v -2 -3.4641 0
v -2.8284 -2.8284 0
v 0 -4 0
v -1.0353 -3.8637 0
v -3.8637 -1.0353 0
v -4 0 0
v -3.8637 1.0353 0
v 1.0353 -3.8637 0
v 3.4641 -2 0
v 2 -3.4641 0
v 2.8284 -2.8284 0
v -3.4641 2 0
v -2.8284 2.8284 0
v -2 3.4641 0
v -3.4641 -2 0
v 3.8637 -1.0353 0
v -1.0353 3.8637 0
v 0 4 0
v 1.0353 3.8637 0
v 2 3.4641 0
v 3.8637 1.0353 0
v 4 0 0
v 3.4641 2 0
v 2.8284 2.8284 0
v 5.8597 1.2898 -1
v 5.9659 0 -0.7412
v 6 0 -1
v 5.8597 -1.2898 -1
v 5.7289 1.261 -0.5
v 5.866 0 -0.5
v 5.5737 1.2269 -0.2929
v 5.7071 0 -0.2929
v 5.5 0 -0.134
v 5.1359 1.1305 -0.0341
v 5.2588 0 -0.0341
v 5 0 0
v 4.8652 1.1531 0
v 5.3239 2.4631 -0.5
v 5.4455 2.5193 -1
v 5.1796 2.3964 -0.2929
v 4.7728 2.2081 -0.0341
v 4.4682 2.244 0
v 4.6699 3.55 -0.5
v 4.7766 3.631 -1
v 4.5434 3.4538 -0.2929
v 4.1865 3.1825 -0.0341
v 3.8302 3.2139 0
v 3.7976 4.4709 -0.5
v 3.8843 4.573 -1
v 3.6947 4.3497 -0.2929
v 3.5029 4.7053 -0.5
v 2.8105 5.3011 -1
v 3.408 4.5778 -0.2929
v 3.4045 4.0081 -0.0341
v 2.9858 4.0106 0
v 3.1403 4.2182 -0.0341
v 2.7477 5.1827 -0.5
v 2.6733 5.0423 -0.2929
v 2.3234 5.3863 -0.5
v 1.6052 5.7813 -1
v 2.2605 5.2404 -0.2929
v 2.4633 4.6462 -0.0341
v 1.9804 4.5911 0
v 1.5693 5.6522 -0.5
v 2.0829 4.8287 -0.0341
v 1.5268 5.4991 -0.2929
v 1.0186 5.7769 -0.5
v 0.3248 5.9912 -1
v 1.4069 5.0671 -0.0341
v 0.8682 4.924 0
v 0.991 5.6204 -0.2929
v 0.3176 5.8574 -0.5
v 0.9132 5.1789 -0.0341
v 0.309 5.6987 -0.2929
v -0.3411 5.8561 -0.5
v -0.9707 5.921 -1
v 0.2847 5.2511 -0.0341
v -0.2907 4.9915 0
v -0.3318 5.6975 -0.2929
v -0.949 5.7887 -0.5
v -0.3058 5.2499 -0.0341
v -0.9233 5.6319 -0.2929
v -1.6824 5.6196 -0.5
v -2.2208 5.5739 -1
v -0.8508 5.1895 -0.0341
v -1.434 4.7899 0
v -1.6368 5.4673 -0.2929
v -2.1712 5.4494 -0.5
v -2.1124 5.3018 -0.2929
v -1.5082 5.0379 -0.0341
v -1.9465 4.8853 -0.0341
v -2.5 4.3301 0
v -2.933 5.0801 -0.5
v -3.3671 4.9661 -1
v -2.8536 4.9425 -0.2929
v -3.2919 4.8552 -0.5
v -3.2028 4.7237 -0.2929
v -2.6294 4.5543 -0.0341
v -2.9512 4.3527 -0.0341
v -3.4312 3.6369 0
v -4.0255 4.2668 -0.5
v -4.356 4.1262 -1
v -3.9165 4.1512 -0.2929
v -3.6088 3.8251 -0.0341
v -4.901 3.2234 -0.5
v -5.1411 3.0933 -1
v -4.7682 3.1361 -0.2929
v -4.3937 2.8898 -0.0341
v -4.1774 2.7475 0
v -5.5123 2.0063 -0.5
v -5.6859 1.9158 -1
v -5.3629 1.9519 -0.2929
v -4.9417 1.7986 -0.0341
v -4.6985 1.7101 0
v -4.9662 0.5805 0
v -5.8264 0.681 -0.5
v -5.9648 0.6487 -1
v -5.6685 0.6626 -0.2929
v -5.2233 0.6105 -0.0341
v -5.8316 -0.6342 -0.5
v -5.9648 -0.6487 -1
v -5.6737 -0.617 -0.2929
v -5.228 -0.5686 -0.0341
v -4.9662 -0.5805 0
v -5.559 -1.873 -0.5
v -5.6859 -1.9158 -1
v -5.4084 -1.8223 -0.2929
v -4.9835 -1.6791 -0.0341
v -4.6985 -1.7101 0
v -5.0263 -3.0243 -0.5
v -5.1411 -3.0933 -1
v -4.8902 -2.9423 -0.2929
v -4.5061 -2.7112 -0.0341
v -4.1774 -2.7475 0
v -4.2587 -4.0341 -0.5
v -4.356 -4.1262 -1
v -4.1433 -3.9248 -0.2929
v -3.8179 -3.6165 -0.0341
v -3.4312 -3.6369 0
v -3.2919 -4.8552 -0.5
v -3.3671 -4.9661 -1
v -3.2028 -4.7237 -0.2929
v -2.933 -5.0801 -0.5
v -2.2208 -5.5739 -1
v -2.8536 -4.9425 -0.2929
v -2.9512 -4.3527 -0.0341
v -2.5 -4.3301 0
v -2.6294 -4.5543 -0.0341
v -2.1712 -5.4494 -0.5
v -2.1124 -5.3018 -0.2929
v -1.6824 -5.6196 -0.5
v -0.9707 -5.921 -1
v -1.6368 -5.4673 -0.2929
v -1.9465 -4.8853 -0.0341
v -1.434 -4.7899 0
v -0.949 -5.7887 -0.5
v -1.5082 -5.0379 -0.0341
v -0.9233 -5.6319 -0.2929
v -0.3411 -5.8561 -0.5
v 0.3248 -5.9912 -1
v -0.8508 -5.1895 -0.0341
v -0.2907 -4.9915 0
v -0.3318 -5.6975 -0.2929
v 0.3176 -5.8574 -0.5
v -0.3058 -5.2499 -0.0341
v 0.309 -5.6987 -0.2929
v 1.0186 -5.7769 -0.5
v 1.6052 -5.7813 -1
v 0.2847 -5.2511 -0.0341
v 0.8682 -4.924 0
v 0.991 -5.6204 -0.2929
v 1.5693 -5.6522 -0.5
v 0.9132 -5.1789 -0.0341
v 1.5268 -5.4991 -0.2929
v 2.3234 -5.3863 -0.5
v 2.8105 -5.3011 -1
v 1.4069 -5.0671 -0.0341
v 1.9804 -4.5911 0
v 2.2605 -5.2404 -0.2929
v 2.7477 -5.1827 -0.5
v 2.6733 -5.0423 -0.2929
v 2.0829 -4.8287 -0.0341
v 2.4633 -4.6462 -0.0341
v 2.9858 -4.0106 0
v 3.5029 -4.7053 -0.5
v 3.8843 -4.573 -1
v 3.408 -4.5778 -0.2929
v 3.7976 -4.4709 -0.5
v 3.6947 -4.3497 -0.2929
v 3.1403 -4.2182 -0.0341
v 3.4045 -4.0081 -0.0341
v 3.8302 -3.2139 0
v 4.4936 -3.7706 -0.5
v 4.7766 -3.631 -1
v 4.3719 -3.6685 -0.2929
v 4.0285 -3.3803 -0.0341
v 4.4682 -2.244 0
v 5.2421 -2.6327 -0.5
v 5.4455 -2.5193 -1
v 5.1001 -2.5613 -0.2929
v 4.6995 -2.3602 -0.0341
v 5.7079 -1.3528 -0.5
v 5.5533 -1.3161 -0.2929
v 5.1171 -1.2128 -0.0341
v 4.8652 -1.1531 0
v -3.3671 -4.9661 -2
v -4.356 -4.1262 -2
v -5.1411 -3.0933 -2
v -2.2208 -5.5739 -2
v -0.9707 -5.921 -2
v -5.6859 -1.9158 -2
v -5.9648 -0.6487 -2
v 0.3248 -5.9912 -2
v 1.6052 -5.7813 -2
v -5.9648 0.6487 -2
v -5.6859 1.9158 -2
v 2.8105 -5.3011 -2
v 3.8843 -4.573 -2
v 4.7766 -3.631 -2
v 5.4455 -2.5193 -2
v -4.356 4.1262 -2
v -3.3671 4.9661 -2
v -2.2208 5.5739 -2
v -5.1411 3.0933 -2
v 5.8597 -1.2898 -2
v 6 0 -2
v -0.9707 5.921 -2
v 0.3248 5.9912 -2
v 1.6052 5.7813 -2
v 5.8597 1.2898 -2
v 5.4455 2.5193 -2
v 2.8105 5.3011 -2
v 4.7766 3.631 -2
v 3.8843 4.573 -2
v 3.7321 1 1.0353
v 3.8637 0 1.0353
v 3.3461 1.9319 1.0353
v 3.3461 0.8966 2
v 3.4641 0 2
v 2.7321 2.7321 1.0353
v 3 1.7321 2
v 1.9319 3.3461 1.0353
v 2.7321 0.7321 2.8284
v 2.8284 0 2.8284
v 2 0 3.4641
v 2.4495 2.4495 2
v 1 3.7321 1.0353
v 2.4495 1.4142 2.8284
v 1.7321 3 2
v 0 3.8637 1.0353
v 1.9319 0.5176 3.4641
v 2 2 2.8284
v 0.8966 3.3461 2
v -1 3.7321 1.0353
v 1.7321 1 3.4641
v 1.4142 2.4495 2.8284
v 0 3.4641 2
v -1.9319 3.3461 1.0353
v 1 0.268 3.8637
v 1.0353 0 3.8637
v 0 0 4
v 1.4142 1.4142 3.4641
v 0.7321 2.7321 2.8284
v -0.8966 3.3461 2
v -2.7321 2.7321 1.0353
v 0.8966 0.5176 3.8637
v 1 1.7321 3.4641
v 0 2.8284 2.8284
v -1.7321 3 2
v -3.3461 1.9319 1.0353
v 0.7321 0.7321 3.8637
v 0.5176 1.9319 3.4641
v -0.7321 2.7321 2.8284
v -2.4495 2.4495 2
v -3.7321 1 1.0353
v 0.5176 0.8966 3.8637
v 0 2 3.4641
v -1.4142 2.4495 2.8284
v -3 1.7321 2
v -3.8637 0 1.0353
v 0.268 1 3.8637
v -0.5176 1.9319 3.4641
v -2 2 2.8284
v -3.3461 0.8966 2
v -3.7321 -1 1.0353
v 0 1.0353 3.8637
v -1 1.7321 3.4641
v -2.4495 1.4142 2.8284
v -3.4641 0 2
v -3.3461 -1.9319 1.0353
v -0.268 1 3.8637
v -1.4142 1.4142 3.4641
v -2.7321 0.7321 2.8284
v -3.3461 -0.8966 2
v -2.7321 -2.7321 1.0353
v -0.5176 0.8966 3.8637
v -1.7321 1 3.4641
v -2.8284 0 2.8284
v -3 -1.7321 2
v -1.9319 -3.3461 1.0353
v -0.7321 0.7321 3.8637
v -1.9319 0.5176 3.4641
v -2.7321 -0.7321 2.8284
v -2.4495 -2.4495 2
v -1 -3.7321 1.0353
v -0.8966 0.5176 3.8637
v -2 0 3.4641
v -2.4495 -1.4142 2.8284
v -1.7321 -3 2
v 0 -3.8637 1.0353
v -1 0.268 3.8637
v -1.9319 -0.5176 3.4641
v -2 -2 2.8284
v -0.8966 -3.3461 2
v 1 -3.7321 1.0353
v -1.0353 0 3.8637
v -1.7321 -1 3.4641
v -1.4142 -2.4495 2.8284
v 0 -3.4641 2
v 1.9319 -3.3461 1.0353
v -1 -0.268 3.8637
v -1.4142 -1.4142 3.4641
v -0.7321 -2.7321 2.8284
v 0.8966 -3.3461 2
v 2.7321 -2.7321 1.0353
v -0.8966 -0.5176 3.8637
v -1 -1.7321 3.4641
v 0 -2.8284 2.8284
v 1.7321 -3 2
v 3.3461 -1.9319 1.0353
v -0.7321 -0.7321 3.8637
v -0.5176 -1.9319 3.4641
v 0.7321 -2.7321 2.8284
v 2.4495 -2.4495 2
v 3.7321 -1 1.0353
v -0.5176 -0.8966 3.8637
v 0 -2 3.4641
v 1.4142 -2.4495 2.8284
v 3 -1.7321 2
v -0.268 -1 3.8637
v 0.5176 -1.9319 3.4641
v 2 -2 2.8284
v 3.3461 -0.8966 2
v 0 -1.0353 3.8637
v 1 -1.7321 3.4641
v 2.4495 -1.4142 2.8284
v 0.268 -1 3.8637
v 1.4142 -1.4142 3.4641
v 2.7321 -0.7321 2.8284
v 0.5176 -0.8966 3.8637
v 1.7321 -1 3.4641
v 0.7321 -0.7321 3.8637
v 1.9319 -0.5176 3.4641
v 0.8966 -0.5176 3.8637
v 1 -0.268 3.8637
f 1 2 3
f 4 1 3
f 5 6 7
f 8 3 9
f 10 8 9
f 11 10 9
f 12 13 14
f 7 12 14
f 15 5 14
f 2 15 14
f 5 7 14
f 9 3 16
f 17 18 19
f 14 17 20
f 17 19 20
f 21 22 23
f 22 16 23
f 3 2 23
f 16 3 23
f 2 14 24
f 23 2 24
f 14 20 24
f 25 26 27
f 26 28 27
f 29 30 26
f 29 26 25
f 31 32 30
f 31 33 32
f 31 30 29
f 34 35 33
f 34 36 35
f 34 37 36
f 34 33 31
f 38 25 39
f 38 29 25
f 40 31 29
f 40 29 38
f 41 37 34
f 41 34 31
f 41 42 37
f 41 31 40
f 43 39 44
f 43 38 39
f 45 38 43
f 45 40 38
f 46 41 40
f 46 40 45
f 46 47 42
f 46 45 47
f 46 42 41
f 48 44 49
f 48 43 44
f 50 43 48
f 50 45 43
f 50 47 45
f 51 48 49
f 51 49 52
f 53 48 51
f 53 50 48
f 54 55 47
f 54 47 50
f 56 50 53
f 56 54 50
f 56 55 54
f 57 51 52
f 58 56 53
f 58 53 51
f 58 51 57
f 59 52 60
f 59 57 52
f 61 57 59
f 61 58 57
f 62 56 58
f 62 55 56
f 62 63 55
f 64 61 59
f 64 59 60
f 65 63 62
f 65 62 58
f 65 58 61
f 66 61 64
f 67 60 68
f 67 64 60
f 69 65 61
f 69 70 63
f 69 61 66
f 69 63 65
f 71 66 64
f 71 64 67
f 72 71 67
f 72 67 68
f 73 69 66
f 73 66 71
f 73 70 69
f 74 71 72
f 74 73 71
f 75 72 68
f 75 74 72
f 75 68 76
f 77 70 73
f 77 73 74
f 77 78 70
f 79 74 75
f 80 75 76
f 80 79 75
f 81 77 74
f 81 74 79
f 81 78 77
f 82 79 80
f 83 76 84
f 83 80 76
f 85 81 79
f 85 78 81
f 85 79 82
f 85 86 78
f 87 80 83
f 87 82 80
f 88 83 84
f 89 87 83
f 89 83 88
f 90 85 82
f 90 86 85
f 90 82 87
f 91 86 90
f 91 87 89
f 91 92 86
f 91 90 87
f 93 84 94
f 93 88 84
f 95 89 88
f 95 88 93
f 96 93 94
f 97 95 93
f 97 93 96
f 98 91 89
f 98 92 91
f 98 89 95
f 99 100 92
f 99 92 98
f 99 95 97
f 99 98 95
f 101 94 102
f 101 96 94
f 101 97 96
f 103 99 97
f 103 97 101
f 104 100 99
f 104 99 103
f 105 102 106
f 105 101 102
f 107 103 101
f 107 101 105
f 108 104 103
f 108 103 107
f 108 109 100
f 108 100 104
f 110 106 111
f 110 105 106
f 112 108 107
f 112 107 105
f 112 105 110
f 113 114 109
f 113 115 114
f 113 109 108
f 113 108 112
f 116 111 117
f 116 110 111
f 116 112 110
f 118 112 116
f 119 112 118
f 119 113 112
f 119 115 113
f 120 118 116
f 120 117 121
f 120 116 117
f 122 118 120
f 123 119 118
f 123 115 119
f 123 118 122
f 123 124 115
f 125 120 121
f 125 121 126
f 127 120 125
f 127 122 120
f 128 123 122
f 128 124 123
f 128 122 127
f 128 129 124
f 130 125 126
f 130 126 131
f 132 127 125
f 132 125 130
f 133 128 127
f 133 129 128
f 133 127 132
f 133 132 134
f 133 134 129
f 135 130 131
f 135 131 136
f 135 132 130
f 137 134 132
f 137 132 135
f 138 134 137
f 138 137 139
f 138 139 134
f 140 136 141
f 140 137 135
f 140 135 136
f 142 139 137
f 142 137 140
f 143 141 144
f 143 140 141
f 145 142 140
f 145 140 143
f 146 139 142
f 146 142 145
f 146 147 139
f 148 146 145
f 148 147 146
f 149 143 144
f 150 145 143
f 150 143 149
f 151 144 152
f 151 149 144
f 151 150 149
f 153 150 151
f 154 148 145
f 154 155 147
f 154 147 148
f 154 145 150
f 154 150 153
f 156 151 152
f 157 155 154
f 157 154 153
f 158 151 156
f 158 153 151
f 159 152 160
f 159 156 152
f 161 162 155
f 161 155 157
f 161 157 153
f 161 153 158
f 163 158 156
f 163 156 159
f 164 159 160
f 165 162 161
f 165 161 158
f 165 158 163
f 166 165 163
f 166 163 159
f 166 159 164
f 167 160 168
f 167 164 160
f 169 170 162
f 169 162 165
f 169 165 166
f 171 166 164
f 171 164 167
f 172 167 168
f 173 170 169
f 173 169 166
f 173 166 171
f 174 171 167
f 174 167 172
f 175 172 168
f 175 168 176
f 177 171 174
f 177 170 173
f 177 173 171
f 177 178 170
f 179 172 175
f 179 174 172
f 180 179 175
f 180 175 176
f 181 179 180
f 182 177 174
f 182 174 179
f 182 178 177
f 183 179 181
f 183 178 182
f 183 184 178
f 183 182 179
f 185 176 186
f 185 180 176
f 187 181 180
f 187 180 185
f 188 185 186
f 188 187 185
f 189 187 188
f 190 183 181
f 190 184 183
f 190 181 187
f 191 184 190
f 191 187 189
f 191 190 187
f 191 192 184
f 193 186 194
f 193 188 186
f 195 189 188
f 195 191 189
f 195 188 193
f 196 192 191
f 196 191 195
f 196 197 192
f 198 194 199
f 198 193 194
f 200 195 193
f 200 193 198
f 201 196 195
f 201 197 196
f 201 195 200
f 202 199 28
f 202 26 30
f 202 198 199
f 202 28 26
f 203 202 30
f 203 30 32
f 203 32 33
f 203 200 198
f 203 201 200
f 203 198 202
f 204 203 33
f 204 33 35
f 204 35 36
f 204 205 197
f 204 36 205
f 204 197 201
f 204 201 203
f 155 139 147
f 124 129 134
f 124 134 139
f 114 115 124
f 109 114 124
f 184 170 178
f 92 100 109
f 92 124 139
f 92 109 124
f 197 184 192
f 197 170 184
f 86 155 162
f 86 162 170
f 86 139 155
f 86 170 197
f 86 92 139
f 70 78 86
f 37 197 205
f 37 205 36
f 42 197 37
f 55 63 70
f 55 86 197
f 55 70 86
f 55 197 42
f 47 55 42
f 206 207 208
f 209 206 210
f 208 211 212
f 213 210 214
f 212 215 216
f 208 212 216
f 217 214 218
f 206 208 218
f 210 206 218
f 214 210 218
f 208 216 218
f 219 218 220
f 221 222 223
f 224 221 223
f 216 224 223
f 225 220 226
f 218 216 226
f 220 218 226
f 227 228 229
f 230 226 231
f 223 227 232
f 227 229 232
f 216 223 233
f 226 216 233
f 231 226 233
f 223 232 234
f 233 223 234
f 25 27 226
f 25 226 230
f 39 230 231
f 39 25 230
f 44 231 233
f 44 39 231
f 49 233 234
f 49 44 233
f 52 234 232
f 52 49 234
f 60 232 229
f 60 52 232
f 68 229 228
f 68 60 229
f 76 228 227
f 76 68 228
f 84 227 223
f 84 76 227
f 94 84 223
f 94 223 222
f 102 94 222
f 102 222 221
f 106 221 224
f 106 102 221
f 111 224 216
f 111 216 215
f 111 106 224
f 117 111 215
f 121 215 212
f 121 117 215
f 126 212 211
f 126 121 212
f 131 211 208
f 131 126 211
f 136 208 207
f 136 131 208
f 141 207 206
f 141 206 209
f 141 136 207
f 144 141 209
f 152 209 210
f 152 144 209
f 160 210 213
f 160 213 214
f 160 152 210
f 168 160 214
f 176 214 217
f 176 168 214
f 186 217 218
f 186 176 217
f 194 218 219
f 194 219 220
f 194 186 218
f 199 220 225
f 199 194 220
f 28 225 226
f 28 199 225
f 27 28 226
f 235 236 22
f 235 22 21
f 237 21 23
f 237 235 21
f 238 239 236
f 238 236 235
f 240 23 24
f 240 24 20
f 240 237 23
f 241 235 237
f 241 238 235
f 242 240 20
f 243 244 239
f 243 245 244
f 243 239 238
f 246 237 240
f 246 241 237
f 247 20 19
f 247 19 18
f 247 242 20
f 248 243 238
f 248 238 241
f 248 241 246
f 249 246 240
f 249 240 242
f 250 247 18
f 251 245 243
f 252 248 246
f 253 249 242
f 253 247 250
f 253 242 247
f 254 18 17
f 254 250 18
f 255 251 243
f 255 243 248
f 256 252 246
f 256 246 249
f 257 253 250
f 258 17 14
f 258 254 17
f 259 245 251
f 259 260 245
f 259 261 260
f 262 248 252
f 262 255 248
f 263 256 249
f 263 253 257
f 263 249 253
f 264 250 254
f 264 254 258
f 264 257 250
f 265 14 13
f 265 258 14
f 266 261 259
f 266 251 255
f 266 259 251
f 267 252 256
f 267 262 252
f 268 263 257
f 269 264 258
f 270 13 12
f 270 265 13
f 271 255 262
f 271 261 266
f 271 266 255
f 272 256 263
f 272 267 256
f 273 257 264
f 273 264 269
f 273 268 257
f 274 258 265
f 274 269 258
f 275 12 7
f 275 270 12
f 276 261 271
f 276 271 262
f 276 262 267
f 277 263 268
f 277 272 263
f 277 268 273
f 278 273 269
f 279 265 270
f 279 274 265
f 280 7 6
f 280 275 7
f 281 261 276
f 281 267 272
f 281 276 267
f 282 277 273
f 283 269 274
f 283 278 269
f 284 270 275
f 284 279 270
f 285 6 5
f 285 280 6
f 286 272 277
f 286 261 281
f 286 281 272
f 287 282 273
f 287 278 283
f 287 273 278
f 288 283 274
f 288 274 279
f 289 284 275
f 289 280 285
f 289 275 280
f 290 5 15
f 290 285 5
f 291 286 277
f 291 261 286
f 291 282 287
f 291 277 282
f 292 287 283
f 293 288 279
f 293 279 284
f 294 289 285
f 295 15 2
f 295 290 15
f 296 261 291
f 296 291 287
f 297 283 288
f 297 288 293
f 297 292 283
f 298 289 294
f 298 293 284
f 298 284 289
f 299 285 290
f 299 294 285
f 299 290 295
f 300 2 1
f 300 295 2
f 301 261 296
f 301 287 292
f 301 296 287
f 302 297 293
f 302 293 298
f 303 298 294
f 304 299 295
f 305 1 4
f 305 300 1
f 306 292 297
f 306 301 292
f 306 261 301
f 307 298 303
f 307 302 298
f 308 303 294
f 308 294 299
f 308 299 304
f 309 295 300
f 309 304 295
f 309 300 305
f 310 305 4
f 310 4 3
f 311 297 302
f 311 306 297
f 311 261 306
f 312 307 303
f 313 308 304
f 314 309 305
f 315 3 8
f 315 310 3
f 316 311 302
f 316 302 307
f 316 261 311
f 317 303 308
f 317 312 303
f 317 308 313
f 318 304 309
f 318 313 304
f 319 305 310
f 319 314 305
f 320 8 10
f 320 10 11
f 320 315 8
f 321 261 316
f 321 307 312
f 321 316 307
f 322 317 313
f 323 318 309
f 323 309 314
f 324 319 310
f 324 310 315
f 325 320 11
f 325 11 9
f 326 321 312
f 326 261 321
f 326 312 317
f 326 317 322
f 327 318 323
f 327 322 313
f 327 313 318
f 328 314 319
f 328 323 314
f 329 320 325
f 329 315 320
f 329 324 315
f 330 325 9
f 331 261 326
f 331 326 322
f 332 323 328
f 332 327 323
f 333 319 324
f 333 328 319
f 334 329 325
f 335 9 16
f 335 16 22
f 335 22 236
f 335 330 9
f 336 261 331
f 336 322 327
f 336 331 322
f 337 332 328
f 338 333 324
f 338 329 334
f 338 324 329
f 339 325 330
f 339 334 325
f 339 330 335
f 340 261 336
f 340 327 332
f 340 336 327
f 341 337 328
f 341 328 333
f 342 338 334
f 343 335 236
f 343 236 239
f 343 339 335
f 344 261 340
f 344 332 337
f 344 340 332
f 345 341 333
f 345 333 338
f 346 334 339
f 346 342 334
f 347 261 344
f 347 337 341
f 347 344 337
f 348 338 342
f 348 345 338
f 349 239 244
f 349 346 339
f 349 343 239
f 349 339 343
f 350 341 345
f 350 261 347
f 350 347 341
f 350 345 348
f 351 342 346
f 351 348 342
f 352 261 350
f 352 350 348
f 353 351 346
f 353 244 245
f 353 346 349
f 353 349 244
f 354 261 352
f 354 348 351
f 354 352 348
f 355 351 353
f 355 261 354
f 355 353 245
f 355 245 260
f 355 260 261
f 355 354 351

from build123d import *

# Parameters (mm, degrees)
F0_R     = 4
F1_DEPTH = 4
F2_R     = 3.99999
F3_R     = 6
F4_DEPTH = 2
F5_R     = 1


# Not quite as in the source:
# - a fillet or chamfer is up to 0.001 mm smaller than in the source, because OpenCascade refuses the exact size


with BuildPart() as f1:
    # F0 (on Top) → F1 (new body)
    with BuildSketch(Plane.XY):
        Circle(F0_R)
    extrude(amount=F1_DEPTH)

    # F2 (radius 4 in the source; OpenCascade refuses exactly that, so slightly less here)
    f2_edges = [f1.edges().sort_by_distance(p)[0] for p in [
        (-4, 0, 4),
    ]]
    fillet(f2_edges, radius=F2_R)


with BuildPart() as f4:
    # F3 (on Top) → F4 (new body)
    with BuildSketch(Plane.XY):
        Circle(F3_R)
    extrude(amount=-F4_DEPTH)

    # F5
    f5_edges = [f4.edges().sort_by_distance(p)[0] for p in [
        (-6, 0, 0),
    ]]
    fillet(f5_edges, radius=F5_R)


solid = Compound([f1.part, f4.part])
